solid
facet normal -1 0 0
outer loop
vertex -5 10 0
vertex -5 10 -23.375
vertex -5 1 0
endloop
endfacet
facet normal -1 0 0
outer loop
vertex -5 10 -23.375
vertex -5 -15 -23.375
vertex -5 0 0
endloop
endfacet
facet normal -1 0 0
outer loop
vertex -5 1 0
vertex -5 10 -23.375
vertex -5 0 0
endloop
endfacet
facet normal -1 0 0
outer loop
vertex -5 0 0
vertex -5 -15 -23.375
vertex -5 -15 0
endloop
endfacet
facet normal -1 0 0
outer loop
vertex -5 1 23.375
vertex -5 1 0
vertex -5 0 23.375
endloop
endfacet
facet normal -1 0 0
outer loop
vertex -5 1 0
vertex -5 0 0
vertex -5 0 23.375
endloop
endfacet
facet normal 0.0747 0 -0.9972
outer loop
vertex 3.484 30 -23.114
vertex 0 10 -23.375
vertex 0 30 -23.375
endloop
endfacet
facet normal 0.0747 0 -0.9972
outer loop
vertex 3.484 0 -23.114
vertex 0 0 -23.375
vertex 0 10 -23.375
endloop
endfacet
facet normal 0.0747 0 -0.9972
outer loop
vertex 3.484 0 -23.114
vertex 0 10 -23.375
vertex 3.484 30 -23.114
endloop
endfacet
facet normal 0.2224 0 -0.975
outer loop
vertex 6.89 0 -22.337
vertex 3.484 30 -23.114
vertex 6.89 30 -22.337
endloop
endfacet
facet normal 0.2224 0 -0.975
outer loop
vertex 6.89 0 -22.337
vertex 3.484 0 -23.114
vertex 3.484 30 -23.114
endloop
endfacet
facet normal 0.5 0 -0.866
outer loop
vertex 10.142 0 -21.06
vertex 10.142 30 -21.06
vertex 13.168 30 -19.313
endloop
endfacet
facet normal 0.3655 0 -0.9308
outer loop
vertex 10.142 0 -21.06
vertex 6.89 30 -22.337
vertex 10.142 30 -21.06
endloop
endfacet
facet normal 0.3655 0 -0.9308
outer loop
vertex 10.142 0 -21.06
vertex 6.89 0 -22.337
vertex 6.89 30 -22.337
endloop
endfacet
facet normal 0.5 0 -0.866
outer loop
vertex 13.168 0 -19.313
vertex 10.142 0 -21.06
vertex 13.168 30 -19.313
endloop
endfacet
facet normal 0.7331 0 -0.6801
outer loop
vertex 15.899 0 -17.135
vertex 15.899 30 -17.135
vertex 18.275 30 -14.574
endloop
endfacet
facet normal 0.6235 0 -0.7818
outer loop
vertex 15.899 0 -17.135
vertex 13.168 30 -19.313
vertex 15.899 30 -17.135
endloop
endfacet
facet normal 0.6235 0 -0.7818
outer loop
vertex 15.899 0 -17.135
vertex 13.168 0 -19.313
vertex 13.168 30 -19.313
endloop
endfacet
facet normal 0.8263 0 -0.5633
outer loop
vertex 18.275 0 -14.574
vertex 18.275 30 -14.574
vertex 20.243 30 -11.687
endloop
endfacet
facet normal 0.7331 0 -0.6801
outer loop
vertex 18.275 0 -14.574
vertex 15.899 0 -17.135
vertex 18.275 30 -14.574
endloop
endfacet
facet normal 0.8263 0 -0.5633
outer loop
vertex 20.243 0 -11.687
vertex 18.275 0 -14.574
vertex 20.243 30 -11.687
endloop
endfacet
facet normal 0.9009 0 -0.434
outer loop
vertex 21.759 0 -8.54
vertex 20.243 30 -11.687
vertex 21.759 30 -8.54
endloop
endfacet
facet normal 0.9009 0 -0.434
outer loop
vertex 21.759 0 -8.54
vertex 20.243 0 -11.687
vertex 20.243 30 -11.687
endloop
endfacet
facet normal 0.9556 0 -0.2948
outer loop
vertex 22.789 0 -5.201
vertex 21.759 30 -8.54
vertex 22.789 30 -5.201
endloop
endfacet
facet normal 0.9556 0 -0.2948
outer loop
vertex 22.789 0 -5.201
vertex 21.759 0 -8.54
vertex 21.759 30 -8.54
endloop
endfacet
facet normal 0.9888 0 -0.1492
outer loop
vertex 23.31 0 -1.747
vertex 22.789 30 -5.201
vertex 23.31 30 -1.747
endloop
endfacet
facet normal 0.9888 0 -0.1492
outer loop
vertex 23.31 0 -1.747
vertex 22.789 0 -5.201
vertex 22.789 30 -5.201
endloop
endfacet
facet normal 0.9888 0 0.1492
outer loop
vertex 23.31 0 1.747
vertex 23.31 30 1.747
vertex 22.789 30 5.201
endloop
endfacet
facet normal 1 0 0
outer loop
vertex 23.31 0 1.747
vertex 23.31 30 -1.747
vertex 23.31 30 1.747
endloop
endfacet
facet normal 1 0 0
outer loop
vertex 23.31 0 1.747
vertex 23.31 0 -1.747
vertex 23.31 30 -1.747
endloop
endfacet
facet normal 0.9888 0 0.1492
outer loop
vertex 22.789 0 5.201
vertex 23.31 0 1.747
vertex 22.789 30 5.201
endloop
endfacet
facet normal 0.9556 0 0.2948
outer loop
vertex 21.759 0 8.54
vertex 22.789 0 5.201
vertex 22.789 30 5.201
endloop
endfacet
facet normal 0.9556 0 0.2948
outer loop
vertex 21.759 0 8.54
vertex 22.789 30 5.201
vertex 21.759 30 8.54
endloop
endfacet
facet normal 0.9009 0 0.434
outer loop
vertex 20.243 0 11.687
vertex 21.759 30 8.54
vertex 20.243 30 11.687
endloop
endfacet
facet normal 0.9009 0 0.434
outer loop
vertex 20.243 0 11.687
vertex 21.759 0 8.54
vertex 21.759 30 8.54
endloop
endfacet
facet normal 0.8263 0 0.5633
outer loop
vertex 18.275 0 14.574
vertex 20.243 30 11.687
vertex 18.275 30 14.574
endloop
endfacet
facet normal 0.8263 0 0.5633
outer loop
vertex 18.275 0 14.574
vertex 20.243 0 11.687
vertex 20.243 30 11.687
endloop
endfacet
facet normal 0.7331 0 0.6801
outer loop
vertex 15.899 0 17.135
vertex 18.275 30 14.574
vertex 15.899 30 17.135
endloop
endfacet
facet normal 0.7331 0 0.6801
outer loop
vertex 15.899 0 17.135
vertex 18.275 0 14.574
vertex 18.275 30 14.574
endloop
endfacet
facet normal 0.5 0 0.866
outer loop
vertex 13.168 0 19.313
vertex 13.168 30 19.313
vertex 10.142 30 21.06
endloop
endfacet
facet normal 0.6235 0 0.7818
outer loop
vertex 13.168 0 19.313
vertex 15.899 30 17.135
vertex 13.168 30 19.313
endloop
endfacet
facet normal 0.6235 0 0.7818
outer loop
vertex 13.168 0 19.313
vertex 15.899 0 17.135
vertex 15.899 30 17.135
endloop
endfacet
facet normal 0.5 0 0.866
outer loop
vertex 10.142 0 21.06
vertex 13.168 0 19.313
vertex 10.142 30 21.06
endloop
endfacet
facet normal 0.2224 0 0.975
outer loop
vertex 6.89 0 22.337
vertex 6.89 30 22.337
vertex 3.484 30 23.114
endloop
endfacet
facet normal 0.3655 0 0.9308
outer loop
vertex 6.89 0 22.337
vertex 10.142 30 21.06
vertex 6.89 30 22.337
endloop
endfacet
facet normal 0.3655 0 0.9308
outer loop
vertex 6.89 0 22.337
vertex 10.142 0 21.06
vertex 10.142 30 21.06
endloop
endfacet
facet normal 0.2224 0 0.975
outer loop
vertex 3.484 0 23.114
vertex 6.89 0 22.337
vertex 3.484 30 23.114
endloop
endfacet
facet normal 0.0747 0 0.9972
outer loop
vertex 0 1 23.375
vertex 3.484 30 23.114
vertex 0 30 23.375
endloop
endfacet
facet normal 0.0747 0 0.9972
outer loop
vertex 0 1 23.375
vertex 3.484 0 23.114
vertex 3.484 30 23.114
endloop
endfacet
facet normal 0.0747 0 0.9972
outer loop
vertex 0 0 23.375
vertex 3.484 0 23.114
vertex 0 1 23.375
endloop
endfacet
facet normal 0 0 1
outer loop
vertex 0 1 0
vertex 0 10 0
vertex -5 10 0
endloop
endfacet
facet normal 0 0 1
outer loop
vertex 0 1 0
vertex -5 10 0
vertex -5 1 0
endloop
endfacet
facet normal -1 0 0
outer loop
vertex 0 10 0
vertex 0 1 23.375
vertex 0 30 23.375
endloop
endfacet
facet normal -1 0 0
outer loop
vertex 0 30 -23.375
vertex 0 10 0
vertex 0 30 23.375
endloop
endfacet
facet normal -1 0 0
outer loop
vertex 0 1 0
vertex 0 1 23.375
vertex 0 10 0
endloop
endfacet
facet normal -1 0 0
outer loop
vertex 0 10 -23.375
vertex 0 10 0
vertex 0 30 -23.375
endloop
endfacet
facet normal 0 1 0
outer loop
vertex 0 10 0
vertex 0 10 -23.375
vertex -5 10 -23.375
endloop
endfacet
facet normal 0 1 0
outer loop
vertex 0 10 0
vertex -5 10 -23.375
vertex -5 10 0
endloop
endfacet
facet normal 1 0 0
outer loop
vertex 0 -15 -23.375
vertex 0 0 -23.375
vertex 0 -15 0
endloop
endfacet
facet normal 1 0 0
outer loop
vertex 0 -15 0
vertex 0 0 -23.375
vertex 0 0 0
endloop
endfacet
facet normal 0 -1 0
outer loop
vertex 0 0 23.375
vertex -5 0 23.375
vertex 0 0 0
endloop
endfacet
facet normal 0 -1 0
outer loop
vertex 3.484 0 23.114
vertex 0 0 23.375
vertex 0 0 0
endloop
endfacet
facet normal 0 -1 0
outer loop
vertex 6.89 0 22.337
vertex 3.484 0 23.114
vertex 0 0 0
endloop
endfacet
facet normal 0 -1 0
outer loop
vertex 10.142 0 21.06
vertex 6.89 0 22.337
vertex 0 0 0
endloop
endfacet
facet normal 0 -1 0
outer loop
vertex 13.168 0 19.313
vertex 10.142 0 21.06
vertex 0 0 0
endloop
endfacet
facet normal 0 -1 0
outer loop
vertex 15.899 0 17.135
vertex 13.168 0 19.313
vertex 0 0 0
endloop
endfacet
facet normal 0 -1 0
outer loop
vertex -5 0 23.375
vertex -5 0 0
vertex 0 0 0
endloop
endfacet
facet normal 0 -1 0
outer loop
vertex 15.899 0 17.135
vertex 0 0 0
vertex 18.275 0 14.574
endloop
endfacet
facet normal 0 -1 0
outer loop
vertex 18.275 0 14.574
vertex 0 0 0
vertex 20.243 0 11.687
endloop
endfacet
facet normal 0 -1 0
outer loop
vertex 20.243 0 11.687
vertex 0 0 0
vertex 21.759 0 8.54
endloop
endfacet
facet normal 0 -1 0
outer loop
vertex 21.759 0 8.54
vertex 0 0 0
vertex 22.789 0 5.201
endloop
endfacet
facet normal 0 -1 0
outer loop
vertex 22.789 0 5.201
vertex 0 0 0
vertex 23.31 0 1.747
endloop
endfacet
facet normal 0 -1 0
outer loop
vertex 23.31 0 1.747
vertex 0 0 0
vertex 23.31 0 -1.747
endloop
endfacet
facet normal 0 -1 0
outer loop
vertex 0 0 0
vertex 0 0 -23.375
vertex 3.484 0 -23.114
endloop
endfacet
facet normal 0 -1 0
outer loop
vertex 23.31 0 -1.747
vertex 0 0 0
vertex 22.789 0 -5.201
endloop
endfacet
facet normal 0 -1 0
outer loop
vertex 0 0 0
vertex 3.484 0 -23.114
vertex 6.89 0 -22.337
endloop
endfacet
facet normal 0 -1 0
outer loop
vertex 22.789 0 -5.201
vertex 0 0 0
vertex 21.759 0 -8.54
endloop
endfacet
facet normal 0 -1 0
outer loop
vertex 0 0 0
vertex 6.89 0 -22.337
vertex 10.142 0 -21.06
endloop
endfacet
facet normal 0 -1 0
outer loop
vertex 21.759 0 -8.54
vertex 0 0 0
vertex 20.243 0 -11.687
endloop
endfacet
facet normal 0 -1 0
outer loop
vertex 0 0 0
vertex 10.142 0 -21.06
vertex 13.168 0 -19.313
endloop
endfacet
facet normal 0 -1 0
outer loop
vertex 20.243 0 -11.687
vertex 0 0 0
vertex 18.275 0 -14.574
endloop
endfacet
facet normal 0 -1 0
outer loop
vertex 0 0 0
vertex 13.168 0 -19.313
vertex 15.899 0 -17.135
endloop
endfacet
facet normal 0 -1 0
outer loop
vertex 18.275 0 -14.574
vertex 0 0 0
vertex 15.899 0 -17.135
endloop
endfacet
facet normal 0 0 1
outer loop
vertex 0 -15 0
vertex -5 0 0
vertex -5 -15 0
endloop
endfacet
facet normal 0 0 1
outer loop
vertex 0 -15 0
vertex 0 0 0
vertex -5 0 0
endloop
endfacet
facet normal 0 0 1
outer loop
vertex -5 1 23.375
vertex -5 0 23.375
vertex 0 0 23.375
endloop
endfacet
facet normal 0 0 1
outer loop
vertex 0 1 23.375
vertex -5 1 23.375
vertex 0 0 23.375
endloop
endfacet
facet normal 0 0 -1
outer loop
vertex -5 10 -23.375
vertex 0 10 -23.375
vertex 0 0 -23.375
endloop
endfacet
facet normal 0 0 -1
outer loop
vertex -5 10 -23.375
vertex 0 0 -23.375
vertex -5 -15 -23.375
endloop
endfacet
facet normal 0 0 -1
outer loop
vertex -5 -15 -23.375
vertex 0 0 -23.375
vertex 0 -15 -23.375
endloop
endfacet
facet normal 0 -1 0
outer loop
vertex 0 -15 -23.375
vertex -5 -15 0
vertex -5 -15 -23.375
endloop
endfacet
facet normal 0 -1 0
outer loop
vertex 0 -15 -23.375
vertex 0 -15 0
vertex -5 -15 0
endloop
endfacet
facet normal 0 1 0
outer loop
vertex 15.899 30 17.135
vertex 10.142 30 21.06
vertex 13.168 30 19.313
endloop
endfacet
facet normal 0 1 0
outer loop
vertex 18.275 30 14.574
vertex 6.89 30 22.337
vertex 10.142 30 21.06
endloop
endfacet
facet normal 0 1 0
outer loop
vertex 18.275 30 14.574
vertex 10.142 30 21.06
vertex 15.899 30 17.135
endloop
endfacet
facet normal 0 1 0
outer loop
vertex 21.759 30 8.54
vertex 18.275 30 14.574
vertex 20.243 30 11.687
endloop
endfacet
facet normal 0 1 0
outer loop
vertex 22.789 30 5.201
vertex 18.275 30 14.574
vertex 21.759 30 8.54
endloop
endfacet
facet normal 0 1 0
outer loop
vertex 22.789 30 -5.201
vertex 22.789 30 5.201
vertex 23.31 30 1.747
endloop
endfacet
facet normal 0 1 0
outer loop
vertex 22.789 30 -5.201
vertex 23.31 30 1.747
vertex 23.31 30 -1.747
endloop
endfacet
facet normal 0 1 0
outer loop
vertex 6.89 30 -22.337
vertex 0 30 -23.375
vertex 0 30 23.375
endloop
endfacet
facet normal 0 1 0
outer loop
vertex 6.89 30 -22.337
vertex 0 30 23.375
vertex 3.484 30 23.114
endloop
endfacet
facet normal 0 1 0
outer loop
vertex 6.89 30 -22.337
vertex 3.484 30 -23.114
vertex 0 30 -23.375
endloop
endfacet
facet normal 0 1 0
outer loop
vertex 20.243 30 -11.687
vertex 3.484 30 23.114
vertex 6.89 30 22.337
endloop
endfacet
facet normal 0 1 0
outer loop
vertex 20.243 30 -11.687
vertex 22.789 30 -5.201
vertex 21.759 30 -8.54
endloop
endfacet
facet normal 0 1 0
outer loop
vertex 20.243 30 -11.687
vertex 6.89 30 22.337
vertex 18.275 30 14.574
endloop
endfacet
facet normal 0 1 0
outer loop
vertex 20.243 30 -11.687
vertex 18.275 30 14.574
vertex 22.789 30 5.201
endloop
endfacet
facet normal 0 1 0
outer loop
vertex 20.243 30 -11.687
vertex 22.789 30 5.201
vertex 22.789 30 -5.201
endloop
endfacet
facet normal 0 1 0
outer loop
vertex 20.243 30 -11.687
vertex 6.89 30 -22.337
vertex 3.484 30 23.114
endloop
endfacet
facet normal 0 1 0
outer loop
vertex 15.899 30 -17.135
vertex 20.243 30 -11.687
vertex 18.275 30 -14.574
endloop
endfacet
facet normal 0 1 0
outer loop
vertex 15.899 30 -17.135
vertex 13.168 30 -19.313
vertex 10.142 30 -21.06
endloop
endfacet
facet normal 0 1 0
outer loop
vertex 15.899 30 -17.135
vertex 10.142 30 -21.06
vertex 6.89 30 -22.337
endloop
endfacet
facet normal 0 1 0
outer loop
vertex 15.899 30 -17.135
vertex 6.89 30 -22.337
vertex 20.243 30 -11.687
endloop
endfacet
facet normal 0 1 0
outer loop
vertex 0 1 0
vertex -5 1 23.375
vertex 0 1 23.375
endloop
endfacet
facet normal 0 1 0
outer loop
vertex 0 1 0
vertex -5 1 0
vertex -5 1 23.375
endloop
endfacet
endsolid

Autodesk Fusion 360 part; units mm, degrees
sketch "Sketch1" plane through (0, 0, 0) normal (0, 1, 0) x (1, 0, 0)
  arc A0 (0, -23.375) -> (0, 23.375) centre (0, 0) ccw
  arc A1 (0, -23.375) -> (0, 23.375) centre (0, 0) ccw
  line L0 (0, -23.375) -> (0, 23.375)
extrude "Extrude1" add sketch "Sketch1" along normal blind 30
sketch "Sketch2" plane through (0, 0, 0) normal (-1, 0, 0) x (0, 0, 1)
  line L0 (-23.375, 0) -> (23.375, 0)
  line L1 (23.375, 0) -> (23.375, 30)
  line L2 (23.375, 30) -> (-23.375, 30)
  line L3 (-23.375, 30) -> (-23.375, 0)
  line L4 (-23.375, 10) -> (0, 10)
  line L5 (0, 10) -> (0, -15)
  line L6 (0, -15) -> (-23.375, -15)
  line L7 (-23.375, -15) -> (-23.375, 10)
extrude "Extrude2" add sketch "Sketch2" along normal blind 5 contours L0 L3 L4 L5 L7 | L0 L5 L6 L7
sketch "Sketch4" plane through (0, 0, 0) normal (0, 1, 0) x (1, 0, 0)
  line L0 (0, 0) -> (-5, 0)
  line L1 (-5, 0) -> (-5, -23.375)
  line L2 (-5, -23.375) -> (0, -23.375)
  line L3 (0, -23.375) -> (0, 0)
  point P0 (0, -23.375)
extrude "Extrude3" add sketch "Sketch4" along normal blind 1
